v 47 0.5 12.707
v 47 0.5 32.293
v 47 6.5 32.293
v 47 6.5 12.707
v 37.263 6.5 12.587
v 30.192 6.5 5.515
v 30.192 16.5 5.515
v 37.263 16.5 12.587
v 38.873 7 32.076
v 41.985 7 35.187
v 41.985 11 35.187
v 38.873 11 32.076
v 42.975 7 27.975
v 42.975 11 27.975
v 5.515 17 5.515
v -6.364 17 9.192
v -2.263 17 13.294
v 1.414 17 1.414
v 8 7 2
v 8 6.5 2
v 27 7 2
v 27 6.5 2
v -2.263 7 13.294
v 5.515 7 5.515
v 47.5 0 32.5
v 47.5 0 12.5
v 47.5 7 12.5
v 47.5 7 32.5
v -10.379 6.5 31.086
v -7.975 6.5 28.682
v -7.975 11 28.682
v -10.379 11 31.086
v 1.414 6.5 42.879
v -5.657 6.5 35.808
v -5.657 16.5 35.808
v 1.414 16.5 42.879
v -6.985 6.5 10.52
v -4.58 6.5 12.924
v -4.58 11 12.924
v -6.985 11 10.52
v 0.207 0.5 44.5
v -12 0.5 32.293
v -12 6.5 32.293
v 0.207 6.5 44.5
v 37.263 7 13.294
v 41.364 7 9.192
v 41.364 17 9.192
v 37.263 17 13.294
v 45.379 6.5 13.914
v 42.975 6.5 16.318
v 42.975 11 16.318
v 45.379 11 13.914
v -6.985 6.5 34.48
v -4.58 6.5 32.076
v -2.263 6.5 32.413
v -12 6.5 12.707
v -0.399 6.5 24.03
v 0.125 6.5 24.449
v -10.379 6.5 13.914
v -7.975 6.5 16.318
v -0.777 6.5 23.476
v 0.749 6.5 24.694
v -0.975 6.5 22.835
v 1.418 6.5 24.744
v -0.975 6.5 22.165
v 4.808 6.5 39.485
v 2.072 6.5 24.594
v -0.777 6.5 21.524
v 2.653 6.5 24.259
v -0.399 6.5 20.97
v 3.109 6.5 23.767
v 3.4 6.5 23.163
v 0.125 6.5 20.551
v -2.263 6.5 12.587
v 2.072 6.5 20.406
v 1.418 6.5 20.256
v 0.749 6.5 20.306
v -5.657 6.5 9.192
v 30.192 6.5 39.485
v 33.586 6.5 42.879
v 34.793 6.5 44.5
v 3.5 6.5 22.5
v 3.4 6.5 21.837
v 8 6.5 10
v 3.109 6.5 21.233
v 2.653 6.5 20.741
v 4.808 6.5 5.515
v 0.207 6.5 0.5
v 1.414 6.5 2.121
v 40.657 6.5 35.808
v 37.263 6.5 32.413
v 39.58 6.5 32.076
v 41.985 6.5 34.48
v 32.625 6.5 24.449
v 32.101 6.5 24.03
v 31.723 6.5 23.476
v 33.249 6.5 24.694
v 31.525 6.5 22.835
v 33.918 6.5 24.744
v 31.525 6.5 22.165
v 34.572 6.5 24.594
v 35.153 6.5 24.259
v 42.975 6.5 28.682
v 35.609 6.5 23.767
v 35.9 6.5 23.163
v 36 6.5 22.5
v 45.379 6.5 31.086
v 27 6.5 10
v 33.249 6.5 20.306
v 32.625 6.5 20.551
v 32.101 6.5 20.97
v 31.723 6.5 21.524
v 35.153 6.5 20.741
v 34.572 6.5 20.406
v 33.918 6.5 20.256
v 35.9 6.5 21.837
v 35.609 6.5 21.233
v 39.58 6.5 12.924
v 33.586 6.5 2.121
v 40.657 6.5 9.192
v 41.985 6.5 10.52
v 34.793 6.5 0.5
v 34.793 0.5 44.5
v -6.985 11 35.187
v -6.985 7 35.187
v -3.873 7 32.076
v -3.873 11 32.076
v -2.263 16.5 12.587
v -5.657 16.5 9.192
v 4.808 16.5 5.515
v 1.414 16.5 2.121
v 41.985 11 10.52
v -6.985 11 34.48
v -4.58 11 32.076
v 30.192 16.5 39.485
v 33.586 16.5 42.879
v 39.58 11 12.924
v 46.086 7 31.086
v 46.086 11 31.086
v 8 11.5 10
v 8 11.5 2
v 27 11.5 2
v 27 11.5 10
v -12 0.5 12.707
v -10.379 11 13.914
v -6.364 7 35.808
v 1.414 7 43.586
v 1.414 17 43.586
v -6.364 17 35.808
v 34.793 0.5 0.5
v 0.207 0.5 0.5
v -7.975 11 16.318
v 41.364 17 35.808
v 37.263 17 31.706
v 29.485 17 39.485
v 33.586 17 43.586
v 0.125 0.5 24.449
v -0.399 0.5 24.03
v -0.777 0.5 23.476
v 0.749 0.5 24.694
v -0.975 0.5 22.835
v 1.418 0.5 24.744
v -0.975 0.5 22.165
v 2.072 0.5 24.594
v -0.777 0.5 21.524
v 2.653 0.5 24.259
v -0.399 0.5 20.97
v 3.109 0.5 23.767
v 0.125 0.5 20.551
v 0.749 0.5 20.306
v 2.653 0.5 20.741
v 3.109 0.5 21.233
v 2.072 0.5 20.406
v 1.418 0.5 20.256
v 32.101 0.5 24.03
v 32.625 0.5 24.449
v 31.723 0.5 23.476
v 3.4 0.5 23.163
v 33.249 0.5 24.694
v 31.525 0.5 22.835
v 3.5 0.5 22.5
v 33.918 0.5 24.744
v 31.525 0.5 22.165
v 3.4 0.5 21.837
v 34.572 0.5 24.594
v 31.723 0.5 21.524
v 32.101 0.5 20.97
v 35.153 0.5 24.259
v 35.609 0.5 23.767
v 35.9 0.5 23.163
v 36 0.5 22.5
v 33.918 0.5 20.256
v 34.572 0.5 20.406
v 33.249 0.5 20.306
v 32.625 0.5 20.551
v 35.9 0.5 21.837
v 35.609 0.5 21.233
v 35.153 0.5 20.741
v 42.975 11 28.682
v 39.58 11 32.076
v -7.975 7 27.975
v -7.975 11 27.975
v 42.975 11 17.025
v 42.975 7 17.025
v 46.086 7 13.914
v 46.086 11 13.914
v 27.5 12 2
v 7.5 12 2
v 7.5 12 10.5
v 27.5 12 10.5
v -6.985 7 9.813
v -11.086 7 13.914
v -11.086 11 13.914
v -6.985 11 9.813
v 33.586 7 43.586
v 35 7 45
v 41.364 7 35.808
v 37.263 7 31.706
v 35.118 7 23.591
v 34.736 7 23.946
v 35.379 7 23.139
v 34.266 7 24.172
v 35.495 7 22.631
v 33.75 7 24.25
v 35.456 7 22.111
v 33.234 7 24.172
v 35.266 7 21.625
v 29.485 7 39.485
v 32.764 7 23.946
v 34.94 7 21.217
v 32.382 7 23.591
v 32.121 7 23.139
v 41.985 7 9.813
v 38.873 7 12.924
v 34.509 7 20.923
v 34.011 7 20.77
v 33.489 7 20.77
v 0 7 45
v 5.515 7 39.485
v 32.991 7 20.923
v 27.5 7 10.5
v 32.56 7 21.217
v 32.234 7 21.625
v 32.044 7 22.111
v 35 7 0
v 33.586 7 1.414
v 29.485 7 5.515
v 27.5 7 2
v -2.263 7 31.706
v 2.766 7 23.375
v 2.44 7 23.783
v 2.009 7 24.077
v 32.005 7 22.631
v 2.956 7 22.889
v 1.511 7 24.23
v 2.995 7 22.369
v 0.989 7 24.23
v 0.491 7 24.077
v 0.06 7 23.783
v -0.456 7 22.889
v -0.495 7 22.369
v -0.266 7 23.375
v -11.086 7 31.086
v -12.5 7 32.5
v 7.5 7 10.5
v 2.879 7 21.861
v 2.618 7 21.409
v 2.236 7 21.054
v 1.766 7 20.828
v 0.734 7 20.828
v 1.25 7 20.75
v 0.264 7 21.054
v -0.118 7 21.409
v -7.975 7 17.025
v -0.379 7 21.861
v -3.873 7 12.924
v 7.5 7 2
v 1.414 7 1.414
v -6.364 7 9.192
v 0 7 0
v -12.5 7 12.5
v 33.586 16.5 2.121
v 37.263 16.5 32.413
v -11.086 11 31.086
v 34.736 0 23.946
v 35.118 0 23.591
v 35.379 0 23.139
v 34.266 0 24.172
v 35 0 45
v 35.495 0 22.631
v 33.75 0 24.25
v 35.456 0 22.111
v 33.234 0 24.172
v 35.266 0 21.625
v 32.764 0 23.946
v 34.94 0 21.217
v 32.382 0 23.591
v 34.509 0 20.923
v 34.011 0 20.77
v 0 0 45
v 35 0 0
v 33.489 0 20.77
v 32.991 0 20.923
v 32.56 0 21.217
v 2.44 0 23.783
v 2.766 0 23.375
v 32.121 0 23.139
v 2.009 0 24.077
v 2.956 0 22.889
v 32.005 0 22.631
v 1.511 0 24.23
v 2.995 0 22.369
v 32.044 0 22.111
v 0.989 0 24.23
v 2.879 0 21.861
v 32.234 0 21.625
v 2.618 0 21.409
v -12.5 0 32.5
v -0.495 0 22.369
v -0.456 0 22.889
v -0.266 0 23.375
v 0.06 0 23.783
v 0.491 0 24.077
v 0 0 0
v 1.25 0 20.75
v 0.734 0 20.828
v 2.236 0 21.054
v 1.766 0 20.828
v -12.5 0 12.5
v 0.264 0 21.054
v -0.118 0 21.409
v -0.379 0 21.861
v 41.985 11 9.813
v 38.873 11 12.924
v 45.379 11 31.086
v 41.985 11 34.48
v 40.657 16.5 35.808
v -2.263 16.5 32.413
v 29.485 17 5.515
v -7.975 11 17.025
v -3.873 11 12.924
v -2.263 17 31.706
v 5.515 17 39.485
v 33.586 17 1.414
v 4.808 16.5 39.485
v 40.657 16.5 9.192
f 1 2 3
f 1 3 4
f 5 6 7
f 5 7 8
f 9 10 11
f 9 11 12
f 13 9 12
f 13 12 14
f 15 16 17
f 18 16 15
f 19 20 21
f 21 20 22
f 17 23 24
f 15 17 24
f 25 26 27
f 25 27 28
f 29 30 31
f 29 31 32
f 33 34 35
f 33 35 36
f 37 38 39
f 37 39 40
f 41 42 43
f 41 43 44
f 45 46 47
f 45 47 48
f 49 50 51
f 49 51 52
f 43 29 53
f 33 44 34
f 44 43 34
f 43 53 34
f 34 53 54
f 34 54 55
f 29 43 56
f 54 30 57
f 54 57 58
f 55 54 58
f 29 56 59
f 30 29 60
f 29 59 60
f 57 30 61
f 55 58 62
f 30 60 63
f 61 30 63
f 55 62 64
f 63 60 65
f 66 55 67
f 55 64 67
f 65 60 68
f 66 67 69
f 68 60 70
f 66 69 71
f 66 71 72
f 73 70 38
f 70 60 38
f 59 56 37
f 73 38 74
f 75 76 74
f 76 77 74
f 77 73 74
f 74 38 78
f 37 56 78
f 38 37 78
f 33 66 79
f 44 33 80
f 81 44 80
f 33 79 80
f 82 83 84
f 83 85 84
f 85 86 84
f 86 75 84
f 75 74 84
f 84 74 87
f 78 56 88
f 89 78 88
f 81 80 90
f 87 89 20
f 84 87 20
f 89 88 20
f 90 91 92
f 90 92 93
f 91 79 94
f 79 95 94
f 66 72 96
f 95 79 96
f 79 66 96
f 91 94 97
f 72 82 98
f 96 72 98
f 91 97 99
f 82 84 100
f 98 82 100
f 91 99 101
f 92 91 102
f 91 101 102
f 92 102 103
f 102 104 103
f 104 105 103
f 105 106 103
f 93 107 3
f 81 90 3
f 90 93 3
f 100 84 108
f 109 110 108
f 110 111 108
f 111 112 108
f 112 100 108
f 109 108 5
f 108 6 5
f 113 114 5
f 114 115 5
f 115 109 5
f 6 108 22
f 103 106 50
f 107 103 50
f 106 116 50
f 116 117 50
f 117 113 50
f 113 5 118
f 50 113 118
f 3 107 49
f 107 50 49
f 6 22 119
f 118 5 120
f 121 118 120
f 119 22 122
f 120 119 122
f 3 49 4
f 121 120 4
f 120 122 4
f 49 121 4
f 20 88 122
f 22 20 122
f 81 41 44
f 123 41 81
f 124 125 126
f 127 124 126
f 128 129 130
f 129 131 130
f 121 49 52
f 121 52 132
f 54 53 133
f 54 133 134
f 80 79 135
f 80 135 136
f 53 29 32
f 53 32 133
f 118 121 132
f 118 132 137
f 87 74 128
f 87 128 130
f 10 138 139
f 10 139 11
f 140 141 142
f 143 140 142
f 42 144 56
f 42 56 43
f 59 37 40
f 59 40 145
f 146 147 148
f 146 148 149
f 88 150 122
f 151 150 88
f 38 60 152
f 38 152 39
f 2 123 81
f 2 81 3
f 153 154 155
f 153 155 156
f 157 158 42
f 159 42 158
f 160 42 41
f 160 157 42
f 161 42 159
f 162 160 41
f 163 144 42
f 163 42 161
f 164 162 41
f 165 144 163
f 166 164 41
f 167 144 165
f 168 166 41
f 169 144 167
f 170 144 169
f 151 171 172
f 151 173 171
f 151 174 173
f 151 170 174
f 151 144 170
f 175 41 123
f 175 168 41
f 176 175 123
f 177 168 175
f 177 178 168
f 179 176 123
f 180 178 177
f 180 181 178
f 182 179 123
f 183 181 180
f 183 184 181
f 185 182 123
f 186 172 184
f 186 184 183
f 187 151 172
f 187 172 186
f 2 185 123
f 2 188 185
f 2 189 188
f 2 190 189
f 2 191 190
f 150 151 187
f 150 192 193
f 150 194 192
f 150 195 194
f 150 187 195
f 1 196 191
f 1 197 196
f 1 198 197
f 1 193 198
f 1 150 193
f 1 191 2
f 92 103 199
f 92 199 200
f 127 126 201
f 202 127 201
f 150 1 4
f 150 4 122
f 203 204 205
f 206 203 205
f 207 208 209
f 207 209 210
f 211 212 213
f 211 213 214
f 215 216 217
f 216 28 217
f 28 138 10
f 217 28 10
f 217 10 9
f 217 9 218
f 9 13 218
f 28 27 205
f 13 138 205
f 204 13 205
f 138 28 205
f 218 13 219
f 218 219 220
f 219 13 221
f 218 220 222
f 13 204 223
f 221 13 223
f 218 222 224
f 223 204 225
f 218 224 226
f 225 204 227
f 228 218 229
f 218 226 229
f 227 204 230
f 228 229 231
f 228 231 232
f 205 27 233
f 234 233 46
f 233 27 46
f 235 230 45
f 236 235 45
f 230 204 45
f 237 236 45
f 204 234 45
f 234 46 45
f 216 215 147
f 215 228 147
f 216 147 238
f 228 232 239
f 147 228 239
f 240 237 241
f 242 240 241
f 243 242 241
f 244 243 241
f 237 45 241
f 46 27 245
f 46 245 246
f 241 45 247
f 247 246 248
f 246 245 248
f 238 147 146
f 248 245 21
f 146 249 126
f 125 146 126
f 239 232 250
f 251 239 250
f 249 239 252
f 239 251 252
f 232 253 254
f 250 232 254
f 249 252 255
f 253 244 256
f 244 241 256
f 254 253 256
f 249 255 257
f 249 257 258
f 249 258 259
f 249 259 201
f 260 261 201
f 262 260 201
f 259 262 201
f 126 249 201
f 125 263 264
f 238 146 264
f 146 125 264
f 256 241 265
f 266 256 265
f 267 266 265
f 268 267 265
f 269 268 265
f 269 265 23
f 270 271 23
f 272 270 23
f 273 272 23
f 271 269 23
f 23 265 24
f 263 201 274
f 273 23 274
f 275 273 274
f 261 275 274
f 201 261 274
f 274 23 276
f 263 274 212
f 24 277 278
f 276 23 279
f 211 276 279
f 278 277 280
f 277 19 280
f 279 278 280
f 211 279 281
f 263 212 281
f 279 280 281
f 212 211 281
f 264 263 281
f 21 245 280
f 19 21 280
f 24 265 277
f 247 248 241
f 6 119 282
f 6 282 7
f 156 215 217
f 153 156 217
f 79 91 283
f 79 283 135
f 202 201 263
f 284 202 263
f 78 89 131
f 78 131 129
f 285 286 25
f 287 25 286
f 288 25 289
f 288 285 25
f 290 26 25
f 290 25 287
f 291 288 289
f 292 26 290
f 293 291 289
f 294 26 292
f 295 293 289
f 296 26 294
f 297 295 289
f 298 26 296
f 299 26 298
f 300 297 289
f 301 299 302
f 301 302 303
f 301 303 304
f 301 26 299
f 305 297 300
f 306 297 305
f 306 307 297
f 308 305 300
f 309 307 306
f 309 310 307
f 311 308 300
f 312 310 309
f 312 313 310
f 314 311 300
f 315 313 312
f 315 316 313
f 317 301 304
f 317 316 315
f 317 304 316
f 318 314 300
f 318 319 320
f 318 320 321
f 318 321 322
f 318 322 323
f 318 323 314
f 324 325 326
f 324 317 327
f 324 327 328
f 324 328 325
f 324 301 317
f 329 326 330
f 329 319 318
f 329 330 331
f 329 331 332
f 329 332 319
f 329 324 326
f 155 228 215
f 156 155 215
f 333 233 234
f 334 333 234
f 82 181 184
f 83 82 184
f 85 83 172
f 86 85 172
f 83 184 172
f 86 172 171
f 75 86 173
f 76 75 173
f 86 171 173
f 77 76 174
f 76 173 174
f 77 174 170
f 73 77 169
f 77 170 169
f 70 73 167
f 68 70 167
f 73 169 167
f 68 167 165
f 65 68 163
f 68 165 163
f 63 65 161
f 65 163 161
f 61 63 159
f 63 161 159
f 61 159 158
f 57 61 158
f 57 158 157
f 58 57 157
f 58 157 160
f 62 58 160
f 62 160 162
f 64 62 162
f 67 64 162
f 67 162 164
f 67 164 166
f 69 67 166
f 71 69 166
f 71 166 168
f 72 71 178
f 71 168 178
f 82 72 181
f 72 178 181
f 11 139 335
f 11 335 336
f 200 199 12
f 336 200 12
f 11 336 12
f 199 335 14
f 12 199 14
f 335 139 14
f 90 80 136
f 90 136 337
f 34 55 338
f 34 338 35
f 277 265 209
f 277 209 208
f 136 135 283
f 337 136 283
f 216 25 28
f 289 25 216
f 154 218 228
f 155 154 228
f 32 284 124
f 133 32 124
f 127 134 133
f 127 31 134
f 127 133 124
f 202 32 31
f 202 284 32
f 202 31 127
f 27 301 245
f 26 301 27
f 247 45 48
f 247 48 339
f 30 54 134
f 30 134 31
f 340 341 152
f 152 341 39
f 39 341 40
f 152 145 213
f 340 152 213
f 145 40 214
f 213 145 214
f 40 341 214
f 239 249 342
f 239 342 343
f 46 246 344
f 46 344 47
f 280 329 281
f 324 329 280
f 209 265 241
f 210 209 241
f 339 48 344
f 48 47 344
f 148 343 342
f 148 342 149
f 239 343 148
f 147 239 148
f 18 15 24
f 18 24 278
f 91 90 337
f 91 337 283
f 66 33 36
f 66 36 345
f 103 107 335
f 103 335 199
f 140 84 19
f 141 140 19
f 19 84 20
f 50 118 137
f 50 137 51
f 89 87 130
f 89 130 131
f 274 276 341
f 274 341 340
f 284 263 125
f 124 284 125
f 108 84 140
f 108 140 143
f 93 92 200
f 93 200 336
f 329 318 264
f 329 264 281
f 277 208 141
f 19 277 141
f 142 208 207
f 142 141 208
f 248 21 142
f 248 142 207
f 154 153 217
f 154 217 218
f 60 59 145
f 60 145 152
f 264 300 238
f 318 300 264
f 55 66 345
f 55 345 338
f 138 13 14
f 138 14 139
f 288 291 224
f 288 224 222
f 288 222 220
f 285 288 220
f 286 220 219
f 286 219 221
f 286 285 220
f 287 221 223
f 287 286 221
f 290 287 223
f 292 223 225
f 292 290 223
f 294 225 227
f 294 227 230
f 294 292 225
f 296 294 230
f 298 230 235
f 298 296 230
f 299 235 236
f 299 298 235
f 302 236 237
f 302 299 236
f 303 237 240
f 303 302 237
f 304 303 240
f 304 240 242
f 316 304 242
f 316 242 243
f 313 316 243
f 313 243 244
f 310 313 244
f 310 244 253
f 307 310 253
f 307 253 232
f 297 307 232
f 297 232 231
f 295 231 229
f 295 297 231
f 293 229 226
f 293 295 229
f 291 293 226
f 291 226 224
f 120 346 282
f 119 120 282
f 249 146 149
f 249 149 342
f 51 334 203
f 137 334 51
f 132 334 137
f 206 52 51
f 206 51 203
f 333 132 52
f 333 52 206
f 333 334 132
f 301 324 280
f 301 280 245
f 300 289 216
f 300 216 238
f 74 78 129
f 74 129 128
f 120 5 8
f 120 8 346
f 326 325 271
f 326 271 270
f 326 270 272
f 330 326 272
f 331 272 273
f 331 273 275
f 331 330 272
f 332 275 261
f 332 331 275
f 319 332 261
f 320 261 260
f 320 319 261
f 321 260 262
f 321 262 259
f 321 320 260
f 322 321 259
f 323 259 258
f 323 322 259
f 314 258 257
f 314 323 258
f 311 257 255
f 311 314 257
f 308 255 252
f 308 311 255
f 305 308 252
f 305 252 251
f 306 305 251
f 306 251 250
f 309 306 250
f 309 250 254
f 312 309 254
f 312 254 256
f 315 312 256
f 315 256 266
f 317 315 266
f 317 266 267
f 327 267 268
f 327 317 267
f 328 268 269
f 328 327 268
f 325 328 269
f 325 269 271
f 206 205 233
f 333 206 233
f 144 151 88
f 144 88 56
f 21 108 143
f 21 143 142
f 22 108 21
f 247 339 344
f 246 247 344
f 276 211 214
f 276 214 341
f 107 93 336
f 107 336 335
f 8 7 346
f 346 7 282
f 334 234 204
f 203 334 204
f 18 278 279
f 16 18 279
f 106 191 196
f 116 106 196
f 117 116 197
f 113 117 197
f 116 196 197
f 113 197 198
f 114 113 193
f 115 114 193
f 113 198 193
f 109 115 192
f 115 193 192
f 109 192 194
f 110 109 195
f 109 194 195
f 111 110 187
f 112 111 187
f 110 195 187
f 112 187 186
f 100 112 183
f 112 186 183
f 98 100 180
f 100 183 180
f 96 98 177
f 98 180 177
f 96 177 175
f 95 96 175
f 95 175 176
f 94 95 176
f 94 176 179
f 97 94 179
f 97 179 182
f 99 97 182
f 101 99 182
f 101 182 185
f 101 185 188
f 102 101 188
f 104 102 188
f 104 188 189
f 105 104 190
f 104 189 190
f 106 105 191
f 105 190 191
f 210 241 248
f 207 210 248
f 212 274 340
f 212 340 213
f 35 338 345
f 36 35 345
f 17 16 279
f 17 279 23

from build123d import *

# Parameters (mm, degrees)
SKETCH_1_R          = 1.75
SKETCH_1_W          = 20
SKETCH_1_H          = 8.5
EXTRUDE_1_DEPTH     = 7
EXTRUDE_2_DEPTH     = 17
EXTRUDE_3_DEPTH     = 11
SKETCH_1_4_W        = 20
SKETCH_1_4_H        = 8.5
EXTRUDE_4_DEPTH     = 12
SHELL_START         = 0.5
SHELL_4_OUTLINE_R   = 2.25
SHELL_4_DEPTH       = 6
SHELL_START_2       = 6.5
SHELL_4_2_DEPTH     = 10
SHELL_4_3_OUTLINE_W = 19
SHELL_4_3_OUTLINE_H = 8
SHELL_4_3_DEPTH     = 5


# Read off the part's stored shape, not the designer's step: 抽壳4
with BuildPart() as part:
    # 草图1 → 凸台-拉伸1 (new body)
    with BuildSketch(Plane(origin=(0, 0, 0), x_dir=(1, 0, 0), z_dir=(0, 1, 0))):
        Polygon((0, 0), (35, 0), (47.5, -12.5), (47.5, -32.5), (35, -45), (0, -45), (-12.5, -32.5), (-12.5, -12.5), align=None)
        with Locations(Location((33.75, -22.5, 0), (0, 0, 270))):
            Circle(SKETCH_1_R, mode=Mode.SUBTRACT)
        with Locations(Location((1.25, -22.5, 0), (0, 0, 90))):
            Circle(SKETCH_1_R, mode=Mode.SUBTRACT)
        Polygon((33.585786438, -43.585786438), (41.363961031, -35.807611845), (37.2627417, -31.706392514), (29.484567107, -39.484567107), align=None, mode=Mode.SUBTRACT)
        Polygon((46.085786438, -31.085786438), (41.984567107, -35.187005769), (38.87329727, -32.075735931), (42.9745166, -27.9745166), align=None, mode=Mode.SUBTRACT)
        Polygon((33.585786438, -1.414213562), (41.363961031, -9.192388155), (37.2627417, -13.293607486), (29.484567107, -5.515432893), align=None, mode=Mode.SUBTRACT)
        Polygon((46.085786438, -13.914213562), (41.984567107, -9.812994231), (38.87329727, -12.924264069), (42.9745166, -17.0254834), align=None, mode=Mode.SUBTRACT)
        Polygon((-7.9745166, -17.0254834), (-11.085786438, -13.914213562), (-6.984567107, -9.812994231), (-3.87329727, -12.924264069), align=None, mode=Mode.SUBTRACT)
        Polygon((5.515432893, -5.515432893), (1.414213562, -1.414213562), (-6.363961031, -9.192388155), (-2.2627417, -13.293607486), align=None, mode=Mode.SUBTRACT)
        Polygon((-11.085786438, -31.085786438), (-6.984567107, -35.187005769), (-3.87329727, -32.075735931), (-7.9745166, -27.9745166), align=None, mode=Mode.SUBTRACT)
        Polygon((-6.363961031, -35.807611845), (-2.2627417, -31.706392514), (5.515432893, -39.484567107), (1.414213562, -43.585786438), align=None, mode=Mode.SUBTRACT)
        with Locations((17.5, -6.25)):
            Rectangle(SKETCH_1_W, SKETCH_1_H, mode=Mode.SUBTRACT)
    extrude(amount=EXTRUDE_1_DEPTH)

    # 草图1<2> → 凸台-拉伸2 (add)
    with BuildSketch(Plane(origin=(0, 0, 0), x_dir=(1, 0, 0), z_dir=(0, 1, 0))):
        Polygon((37.2627417, -13.293607486), (29.484567107, -5.515432893), (33.585786438, -1.414213562), (41.363961031, -9.192388155), align=None)
        Polygon((-6.363961031, -9.192388155), (-2.2627417, -13.293607486), (5.515432893, -5.515432893), (1.414213562, -1.414213562), align=None)
        Polygon((-2.2627417, -31.706392514), (5.515432893, -39.484567107), (1.414213562, -43.585786438), (-6.363961031, -35.807611845), align=None)
        Polygon((37.2627417, -31.706392514), (29.484567107, -39.484567107), (33.585786438, -43.585786438), (41.363961031, -35.807611845), align=None)
    extrude(amount=EXTRUDE_2_DEPTH)

    # 草图1<3> → 凸台-拉伸3 (add)
    with BuildSketch(Plane(origin=(0, 0, 0), x_dir=(1, 0, 0), z_dir=(0, 1, 0))):
        Polygon((-11.085786438, -31.085786438), (-6.984567107, -35.187005769), (-3.87329727, -32.075735931), (-7.9745166, -27.9745166), align=None)
        Polygon((42.9745166, -27.9745166), (46.085786438, -31.085786438), (41.984567107, -35.187005769), (38.87329727, -32.075735931), align=None)
        Polygon((41.984567107, -9.812994231), (38.87329727, -12.924264069), (42.9745166, -17.0254834), (46.085786438, -13.914213562), align=None)
        Polygon((-6.984567107, -9.812994231), (-3.87329727, -12.924264069), (-7.9745166, -17.0254834), (-11.085786438, -13.914213562), align=None)
    extrude(amount=EXTRUDE_3_DEPTH)

    # 草图1<4> → 凸台-拉伸4 (add)
    with BuildSketch(Plane(origin=(0, 0, 0), x_dir=(1, 0, 0), z_dir=(0, 1, 0))):
        with Locations((17.5, -6.25)):
            Rectangle(SKETCH_1_4_W, SKETCH_1_4_H)
    extrude(amount=EXTRUDE_4_DEPTH)

    # 抽壳4 outline → 抽壳4 (cut)
    with BuildSketch(Plane(origin=(0, 0, 0), x_dir=(1, 0, 0), z_dir=(0, 1, 0)).offset(SHELL_START)):
        Polygon((0.207106781, -0.5), (-12, -12.707106781), (-12, -32.292893219), (0.207106781, -44.5), (34.792893219, -44.5), (47, -32.292893219), (47, -12.707106781), (34.792893219, -0.5), align=None)
        with Locations((1.25, -22.5)):
            Circle(SHELL_4_OUTLINE_R, mode=Mode.SUBTRACT)
        with Locations((33.75, -22.5)):
            Circle(SHELL_4_OUTLINE_R, mode=Mode.SUBTRACT)
    extrude(amount=SHELL_4_DEPTH, mode=Mode.SUBTRACT)

    # Shell 4 2 outline → Shell 4 2 (cut)
    with BuildSketch(Plane(origin=(0, 0, 0), x_dir=(1, 0, 0), z_dir=(0, 1, 0)).offset(SHELL_START_2)):
        Polygon((33.585786438, -2.121320344), (30.191673888, -5.515432893), (37.2627417, -12.586500705), (40.656854249, -9.192388155), align=None)
        Polygon((45.378679656, -13.914213562), (41.984567107, -10.520101013), (39.580404051, -12.924264069), (42.9745166, -16.318376618), align=None)
        Polygon((-5.656854249, -9.192388155), (-2.2627417, -12.586500705), (4.808326112, -5.515432893), (1.414213562, -2.121320344), align=None)
        Polygon((-4.580404051, -12.924264069), (-6.984567107, -10.520101013), (-10.378679656, -13.914213562), (-7.9745166, -16.318376618), align=None)
        Polygon((4.808326112, -39.484567107), (-2.2627417, -32.413499295), (-5.656854249, -35.807611845), (1.414213562, -42.878679656), align=None)
        Polygon((-10.378679656, -31.085786438), (-6.984567107, -34.479898987), (-4.580404051, -32.075735931), (-7.9745166, -28.681623382), align=None)
        Polygon((37.2627417, -32.413499295), (30.191673888, -39.484567107), (33.585786438, -42.878679656), (40.656854249, -35.807611845), align=None)
        Polygon((39.580404051, -32.075735931), (41.984567107, -34.479898987), (45.378679656, -31.085786438), (42.9745166, -28.681623382), align=None)
    extrude(amount=SHELL_4_2_DEPTH, mode=Mode.SUBTRACT)

    # Shell 4 3 outline → Shell 4 3 (cut)
    with BuildSketch(Plane(origin=(0, 0, 0), x_dir=(1, 0, 0), z_dir=(0, 1, 0)).offset(SHELL_START_2)):
        with Locations((17.5, -6)):
            Rectangle(SHELL_4_3_OUTLINE_W, SHELL_4_3_OUTLINE_H)
    extrude(amount=SHELL_4_3_DEPTH, mode=Mode.SUBTRACT)


solid = part.part
